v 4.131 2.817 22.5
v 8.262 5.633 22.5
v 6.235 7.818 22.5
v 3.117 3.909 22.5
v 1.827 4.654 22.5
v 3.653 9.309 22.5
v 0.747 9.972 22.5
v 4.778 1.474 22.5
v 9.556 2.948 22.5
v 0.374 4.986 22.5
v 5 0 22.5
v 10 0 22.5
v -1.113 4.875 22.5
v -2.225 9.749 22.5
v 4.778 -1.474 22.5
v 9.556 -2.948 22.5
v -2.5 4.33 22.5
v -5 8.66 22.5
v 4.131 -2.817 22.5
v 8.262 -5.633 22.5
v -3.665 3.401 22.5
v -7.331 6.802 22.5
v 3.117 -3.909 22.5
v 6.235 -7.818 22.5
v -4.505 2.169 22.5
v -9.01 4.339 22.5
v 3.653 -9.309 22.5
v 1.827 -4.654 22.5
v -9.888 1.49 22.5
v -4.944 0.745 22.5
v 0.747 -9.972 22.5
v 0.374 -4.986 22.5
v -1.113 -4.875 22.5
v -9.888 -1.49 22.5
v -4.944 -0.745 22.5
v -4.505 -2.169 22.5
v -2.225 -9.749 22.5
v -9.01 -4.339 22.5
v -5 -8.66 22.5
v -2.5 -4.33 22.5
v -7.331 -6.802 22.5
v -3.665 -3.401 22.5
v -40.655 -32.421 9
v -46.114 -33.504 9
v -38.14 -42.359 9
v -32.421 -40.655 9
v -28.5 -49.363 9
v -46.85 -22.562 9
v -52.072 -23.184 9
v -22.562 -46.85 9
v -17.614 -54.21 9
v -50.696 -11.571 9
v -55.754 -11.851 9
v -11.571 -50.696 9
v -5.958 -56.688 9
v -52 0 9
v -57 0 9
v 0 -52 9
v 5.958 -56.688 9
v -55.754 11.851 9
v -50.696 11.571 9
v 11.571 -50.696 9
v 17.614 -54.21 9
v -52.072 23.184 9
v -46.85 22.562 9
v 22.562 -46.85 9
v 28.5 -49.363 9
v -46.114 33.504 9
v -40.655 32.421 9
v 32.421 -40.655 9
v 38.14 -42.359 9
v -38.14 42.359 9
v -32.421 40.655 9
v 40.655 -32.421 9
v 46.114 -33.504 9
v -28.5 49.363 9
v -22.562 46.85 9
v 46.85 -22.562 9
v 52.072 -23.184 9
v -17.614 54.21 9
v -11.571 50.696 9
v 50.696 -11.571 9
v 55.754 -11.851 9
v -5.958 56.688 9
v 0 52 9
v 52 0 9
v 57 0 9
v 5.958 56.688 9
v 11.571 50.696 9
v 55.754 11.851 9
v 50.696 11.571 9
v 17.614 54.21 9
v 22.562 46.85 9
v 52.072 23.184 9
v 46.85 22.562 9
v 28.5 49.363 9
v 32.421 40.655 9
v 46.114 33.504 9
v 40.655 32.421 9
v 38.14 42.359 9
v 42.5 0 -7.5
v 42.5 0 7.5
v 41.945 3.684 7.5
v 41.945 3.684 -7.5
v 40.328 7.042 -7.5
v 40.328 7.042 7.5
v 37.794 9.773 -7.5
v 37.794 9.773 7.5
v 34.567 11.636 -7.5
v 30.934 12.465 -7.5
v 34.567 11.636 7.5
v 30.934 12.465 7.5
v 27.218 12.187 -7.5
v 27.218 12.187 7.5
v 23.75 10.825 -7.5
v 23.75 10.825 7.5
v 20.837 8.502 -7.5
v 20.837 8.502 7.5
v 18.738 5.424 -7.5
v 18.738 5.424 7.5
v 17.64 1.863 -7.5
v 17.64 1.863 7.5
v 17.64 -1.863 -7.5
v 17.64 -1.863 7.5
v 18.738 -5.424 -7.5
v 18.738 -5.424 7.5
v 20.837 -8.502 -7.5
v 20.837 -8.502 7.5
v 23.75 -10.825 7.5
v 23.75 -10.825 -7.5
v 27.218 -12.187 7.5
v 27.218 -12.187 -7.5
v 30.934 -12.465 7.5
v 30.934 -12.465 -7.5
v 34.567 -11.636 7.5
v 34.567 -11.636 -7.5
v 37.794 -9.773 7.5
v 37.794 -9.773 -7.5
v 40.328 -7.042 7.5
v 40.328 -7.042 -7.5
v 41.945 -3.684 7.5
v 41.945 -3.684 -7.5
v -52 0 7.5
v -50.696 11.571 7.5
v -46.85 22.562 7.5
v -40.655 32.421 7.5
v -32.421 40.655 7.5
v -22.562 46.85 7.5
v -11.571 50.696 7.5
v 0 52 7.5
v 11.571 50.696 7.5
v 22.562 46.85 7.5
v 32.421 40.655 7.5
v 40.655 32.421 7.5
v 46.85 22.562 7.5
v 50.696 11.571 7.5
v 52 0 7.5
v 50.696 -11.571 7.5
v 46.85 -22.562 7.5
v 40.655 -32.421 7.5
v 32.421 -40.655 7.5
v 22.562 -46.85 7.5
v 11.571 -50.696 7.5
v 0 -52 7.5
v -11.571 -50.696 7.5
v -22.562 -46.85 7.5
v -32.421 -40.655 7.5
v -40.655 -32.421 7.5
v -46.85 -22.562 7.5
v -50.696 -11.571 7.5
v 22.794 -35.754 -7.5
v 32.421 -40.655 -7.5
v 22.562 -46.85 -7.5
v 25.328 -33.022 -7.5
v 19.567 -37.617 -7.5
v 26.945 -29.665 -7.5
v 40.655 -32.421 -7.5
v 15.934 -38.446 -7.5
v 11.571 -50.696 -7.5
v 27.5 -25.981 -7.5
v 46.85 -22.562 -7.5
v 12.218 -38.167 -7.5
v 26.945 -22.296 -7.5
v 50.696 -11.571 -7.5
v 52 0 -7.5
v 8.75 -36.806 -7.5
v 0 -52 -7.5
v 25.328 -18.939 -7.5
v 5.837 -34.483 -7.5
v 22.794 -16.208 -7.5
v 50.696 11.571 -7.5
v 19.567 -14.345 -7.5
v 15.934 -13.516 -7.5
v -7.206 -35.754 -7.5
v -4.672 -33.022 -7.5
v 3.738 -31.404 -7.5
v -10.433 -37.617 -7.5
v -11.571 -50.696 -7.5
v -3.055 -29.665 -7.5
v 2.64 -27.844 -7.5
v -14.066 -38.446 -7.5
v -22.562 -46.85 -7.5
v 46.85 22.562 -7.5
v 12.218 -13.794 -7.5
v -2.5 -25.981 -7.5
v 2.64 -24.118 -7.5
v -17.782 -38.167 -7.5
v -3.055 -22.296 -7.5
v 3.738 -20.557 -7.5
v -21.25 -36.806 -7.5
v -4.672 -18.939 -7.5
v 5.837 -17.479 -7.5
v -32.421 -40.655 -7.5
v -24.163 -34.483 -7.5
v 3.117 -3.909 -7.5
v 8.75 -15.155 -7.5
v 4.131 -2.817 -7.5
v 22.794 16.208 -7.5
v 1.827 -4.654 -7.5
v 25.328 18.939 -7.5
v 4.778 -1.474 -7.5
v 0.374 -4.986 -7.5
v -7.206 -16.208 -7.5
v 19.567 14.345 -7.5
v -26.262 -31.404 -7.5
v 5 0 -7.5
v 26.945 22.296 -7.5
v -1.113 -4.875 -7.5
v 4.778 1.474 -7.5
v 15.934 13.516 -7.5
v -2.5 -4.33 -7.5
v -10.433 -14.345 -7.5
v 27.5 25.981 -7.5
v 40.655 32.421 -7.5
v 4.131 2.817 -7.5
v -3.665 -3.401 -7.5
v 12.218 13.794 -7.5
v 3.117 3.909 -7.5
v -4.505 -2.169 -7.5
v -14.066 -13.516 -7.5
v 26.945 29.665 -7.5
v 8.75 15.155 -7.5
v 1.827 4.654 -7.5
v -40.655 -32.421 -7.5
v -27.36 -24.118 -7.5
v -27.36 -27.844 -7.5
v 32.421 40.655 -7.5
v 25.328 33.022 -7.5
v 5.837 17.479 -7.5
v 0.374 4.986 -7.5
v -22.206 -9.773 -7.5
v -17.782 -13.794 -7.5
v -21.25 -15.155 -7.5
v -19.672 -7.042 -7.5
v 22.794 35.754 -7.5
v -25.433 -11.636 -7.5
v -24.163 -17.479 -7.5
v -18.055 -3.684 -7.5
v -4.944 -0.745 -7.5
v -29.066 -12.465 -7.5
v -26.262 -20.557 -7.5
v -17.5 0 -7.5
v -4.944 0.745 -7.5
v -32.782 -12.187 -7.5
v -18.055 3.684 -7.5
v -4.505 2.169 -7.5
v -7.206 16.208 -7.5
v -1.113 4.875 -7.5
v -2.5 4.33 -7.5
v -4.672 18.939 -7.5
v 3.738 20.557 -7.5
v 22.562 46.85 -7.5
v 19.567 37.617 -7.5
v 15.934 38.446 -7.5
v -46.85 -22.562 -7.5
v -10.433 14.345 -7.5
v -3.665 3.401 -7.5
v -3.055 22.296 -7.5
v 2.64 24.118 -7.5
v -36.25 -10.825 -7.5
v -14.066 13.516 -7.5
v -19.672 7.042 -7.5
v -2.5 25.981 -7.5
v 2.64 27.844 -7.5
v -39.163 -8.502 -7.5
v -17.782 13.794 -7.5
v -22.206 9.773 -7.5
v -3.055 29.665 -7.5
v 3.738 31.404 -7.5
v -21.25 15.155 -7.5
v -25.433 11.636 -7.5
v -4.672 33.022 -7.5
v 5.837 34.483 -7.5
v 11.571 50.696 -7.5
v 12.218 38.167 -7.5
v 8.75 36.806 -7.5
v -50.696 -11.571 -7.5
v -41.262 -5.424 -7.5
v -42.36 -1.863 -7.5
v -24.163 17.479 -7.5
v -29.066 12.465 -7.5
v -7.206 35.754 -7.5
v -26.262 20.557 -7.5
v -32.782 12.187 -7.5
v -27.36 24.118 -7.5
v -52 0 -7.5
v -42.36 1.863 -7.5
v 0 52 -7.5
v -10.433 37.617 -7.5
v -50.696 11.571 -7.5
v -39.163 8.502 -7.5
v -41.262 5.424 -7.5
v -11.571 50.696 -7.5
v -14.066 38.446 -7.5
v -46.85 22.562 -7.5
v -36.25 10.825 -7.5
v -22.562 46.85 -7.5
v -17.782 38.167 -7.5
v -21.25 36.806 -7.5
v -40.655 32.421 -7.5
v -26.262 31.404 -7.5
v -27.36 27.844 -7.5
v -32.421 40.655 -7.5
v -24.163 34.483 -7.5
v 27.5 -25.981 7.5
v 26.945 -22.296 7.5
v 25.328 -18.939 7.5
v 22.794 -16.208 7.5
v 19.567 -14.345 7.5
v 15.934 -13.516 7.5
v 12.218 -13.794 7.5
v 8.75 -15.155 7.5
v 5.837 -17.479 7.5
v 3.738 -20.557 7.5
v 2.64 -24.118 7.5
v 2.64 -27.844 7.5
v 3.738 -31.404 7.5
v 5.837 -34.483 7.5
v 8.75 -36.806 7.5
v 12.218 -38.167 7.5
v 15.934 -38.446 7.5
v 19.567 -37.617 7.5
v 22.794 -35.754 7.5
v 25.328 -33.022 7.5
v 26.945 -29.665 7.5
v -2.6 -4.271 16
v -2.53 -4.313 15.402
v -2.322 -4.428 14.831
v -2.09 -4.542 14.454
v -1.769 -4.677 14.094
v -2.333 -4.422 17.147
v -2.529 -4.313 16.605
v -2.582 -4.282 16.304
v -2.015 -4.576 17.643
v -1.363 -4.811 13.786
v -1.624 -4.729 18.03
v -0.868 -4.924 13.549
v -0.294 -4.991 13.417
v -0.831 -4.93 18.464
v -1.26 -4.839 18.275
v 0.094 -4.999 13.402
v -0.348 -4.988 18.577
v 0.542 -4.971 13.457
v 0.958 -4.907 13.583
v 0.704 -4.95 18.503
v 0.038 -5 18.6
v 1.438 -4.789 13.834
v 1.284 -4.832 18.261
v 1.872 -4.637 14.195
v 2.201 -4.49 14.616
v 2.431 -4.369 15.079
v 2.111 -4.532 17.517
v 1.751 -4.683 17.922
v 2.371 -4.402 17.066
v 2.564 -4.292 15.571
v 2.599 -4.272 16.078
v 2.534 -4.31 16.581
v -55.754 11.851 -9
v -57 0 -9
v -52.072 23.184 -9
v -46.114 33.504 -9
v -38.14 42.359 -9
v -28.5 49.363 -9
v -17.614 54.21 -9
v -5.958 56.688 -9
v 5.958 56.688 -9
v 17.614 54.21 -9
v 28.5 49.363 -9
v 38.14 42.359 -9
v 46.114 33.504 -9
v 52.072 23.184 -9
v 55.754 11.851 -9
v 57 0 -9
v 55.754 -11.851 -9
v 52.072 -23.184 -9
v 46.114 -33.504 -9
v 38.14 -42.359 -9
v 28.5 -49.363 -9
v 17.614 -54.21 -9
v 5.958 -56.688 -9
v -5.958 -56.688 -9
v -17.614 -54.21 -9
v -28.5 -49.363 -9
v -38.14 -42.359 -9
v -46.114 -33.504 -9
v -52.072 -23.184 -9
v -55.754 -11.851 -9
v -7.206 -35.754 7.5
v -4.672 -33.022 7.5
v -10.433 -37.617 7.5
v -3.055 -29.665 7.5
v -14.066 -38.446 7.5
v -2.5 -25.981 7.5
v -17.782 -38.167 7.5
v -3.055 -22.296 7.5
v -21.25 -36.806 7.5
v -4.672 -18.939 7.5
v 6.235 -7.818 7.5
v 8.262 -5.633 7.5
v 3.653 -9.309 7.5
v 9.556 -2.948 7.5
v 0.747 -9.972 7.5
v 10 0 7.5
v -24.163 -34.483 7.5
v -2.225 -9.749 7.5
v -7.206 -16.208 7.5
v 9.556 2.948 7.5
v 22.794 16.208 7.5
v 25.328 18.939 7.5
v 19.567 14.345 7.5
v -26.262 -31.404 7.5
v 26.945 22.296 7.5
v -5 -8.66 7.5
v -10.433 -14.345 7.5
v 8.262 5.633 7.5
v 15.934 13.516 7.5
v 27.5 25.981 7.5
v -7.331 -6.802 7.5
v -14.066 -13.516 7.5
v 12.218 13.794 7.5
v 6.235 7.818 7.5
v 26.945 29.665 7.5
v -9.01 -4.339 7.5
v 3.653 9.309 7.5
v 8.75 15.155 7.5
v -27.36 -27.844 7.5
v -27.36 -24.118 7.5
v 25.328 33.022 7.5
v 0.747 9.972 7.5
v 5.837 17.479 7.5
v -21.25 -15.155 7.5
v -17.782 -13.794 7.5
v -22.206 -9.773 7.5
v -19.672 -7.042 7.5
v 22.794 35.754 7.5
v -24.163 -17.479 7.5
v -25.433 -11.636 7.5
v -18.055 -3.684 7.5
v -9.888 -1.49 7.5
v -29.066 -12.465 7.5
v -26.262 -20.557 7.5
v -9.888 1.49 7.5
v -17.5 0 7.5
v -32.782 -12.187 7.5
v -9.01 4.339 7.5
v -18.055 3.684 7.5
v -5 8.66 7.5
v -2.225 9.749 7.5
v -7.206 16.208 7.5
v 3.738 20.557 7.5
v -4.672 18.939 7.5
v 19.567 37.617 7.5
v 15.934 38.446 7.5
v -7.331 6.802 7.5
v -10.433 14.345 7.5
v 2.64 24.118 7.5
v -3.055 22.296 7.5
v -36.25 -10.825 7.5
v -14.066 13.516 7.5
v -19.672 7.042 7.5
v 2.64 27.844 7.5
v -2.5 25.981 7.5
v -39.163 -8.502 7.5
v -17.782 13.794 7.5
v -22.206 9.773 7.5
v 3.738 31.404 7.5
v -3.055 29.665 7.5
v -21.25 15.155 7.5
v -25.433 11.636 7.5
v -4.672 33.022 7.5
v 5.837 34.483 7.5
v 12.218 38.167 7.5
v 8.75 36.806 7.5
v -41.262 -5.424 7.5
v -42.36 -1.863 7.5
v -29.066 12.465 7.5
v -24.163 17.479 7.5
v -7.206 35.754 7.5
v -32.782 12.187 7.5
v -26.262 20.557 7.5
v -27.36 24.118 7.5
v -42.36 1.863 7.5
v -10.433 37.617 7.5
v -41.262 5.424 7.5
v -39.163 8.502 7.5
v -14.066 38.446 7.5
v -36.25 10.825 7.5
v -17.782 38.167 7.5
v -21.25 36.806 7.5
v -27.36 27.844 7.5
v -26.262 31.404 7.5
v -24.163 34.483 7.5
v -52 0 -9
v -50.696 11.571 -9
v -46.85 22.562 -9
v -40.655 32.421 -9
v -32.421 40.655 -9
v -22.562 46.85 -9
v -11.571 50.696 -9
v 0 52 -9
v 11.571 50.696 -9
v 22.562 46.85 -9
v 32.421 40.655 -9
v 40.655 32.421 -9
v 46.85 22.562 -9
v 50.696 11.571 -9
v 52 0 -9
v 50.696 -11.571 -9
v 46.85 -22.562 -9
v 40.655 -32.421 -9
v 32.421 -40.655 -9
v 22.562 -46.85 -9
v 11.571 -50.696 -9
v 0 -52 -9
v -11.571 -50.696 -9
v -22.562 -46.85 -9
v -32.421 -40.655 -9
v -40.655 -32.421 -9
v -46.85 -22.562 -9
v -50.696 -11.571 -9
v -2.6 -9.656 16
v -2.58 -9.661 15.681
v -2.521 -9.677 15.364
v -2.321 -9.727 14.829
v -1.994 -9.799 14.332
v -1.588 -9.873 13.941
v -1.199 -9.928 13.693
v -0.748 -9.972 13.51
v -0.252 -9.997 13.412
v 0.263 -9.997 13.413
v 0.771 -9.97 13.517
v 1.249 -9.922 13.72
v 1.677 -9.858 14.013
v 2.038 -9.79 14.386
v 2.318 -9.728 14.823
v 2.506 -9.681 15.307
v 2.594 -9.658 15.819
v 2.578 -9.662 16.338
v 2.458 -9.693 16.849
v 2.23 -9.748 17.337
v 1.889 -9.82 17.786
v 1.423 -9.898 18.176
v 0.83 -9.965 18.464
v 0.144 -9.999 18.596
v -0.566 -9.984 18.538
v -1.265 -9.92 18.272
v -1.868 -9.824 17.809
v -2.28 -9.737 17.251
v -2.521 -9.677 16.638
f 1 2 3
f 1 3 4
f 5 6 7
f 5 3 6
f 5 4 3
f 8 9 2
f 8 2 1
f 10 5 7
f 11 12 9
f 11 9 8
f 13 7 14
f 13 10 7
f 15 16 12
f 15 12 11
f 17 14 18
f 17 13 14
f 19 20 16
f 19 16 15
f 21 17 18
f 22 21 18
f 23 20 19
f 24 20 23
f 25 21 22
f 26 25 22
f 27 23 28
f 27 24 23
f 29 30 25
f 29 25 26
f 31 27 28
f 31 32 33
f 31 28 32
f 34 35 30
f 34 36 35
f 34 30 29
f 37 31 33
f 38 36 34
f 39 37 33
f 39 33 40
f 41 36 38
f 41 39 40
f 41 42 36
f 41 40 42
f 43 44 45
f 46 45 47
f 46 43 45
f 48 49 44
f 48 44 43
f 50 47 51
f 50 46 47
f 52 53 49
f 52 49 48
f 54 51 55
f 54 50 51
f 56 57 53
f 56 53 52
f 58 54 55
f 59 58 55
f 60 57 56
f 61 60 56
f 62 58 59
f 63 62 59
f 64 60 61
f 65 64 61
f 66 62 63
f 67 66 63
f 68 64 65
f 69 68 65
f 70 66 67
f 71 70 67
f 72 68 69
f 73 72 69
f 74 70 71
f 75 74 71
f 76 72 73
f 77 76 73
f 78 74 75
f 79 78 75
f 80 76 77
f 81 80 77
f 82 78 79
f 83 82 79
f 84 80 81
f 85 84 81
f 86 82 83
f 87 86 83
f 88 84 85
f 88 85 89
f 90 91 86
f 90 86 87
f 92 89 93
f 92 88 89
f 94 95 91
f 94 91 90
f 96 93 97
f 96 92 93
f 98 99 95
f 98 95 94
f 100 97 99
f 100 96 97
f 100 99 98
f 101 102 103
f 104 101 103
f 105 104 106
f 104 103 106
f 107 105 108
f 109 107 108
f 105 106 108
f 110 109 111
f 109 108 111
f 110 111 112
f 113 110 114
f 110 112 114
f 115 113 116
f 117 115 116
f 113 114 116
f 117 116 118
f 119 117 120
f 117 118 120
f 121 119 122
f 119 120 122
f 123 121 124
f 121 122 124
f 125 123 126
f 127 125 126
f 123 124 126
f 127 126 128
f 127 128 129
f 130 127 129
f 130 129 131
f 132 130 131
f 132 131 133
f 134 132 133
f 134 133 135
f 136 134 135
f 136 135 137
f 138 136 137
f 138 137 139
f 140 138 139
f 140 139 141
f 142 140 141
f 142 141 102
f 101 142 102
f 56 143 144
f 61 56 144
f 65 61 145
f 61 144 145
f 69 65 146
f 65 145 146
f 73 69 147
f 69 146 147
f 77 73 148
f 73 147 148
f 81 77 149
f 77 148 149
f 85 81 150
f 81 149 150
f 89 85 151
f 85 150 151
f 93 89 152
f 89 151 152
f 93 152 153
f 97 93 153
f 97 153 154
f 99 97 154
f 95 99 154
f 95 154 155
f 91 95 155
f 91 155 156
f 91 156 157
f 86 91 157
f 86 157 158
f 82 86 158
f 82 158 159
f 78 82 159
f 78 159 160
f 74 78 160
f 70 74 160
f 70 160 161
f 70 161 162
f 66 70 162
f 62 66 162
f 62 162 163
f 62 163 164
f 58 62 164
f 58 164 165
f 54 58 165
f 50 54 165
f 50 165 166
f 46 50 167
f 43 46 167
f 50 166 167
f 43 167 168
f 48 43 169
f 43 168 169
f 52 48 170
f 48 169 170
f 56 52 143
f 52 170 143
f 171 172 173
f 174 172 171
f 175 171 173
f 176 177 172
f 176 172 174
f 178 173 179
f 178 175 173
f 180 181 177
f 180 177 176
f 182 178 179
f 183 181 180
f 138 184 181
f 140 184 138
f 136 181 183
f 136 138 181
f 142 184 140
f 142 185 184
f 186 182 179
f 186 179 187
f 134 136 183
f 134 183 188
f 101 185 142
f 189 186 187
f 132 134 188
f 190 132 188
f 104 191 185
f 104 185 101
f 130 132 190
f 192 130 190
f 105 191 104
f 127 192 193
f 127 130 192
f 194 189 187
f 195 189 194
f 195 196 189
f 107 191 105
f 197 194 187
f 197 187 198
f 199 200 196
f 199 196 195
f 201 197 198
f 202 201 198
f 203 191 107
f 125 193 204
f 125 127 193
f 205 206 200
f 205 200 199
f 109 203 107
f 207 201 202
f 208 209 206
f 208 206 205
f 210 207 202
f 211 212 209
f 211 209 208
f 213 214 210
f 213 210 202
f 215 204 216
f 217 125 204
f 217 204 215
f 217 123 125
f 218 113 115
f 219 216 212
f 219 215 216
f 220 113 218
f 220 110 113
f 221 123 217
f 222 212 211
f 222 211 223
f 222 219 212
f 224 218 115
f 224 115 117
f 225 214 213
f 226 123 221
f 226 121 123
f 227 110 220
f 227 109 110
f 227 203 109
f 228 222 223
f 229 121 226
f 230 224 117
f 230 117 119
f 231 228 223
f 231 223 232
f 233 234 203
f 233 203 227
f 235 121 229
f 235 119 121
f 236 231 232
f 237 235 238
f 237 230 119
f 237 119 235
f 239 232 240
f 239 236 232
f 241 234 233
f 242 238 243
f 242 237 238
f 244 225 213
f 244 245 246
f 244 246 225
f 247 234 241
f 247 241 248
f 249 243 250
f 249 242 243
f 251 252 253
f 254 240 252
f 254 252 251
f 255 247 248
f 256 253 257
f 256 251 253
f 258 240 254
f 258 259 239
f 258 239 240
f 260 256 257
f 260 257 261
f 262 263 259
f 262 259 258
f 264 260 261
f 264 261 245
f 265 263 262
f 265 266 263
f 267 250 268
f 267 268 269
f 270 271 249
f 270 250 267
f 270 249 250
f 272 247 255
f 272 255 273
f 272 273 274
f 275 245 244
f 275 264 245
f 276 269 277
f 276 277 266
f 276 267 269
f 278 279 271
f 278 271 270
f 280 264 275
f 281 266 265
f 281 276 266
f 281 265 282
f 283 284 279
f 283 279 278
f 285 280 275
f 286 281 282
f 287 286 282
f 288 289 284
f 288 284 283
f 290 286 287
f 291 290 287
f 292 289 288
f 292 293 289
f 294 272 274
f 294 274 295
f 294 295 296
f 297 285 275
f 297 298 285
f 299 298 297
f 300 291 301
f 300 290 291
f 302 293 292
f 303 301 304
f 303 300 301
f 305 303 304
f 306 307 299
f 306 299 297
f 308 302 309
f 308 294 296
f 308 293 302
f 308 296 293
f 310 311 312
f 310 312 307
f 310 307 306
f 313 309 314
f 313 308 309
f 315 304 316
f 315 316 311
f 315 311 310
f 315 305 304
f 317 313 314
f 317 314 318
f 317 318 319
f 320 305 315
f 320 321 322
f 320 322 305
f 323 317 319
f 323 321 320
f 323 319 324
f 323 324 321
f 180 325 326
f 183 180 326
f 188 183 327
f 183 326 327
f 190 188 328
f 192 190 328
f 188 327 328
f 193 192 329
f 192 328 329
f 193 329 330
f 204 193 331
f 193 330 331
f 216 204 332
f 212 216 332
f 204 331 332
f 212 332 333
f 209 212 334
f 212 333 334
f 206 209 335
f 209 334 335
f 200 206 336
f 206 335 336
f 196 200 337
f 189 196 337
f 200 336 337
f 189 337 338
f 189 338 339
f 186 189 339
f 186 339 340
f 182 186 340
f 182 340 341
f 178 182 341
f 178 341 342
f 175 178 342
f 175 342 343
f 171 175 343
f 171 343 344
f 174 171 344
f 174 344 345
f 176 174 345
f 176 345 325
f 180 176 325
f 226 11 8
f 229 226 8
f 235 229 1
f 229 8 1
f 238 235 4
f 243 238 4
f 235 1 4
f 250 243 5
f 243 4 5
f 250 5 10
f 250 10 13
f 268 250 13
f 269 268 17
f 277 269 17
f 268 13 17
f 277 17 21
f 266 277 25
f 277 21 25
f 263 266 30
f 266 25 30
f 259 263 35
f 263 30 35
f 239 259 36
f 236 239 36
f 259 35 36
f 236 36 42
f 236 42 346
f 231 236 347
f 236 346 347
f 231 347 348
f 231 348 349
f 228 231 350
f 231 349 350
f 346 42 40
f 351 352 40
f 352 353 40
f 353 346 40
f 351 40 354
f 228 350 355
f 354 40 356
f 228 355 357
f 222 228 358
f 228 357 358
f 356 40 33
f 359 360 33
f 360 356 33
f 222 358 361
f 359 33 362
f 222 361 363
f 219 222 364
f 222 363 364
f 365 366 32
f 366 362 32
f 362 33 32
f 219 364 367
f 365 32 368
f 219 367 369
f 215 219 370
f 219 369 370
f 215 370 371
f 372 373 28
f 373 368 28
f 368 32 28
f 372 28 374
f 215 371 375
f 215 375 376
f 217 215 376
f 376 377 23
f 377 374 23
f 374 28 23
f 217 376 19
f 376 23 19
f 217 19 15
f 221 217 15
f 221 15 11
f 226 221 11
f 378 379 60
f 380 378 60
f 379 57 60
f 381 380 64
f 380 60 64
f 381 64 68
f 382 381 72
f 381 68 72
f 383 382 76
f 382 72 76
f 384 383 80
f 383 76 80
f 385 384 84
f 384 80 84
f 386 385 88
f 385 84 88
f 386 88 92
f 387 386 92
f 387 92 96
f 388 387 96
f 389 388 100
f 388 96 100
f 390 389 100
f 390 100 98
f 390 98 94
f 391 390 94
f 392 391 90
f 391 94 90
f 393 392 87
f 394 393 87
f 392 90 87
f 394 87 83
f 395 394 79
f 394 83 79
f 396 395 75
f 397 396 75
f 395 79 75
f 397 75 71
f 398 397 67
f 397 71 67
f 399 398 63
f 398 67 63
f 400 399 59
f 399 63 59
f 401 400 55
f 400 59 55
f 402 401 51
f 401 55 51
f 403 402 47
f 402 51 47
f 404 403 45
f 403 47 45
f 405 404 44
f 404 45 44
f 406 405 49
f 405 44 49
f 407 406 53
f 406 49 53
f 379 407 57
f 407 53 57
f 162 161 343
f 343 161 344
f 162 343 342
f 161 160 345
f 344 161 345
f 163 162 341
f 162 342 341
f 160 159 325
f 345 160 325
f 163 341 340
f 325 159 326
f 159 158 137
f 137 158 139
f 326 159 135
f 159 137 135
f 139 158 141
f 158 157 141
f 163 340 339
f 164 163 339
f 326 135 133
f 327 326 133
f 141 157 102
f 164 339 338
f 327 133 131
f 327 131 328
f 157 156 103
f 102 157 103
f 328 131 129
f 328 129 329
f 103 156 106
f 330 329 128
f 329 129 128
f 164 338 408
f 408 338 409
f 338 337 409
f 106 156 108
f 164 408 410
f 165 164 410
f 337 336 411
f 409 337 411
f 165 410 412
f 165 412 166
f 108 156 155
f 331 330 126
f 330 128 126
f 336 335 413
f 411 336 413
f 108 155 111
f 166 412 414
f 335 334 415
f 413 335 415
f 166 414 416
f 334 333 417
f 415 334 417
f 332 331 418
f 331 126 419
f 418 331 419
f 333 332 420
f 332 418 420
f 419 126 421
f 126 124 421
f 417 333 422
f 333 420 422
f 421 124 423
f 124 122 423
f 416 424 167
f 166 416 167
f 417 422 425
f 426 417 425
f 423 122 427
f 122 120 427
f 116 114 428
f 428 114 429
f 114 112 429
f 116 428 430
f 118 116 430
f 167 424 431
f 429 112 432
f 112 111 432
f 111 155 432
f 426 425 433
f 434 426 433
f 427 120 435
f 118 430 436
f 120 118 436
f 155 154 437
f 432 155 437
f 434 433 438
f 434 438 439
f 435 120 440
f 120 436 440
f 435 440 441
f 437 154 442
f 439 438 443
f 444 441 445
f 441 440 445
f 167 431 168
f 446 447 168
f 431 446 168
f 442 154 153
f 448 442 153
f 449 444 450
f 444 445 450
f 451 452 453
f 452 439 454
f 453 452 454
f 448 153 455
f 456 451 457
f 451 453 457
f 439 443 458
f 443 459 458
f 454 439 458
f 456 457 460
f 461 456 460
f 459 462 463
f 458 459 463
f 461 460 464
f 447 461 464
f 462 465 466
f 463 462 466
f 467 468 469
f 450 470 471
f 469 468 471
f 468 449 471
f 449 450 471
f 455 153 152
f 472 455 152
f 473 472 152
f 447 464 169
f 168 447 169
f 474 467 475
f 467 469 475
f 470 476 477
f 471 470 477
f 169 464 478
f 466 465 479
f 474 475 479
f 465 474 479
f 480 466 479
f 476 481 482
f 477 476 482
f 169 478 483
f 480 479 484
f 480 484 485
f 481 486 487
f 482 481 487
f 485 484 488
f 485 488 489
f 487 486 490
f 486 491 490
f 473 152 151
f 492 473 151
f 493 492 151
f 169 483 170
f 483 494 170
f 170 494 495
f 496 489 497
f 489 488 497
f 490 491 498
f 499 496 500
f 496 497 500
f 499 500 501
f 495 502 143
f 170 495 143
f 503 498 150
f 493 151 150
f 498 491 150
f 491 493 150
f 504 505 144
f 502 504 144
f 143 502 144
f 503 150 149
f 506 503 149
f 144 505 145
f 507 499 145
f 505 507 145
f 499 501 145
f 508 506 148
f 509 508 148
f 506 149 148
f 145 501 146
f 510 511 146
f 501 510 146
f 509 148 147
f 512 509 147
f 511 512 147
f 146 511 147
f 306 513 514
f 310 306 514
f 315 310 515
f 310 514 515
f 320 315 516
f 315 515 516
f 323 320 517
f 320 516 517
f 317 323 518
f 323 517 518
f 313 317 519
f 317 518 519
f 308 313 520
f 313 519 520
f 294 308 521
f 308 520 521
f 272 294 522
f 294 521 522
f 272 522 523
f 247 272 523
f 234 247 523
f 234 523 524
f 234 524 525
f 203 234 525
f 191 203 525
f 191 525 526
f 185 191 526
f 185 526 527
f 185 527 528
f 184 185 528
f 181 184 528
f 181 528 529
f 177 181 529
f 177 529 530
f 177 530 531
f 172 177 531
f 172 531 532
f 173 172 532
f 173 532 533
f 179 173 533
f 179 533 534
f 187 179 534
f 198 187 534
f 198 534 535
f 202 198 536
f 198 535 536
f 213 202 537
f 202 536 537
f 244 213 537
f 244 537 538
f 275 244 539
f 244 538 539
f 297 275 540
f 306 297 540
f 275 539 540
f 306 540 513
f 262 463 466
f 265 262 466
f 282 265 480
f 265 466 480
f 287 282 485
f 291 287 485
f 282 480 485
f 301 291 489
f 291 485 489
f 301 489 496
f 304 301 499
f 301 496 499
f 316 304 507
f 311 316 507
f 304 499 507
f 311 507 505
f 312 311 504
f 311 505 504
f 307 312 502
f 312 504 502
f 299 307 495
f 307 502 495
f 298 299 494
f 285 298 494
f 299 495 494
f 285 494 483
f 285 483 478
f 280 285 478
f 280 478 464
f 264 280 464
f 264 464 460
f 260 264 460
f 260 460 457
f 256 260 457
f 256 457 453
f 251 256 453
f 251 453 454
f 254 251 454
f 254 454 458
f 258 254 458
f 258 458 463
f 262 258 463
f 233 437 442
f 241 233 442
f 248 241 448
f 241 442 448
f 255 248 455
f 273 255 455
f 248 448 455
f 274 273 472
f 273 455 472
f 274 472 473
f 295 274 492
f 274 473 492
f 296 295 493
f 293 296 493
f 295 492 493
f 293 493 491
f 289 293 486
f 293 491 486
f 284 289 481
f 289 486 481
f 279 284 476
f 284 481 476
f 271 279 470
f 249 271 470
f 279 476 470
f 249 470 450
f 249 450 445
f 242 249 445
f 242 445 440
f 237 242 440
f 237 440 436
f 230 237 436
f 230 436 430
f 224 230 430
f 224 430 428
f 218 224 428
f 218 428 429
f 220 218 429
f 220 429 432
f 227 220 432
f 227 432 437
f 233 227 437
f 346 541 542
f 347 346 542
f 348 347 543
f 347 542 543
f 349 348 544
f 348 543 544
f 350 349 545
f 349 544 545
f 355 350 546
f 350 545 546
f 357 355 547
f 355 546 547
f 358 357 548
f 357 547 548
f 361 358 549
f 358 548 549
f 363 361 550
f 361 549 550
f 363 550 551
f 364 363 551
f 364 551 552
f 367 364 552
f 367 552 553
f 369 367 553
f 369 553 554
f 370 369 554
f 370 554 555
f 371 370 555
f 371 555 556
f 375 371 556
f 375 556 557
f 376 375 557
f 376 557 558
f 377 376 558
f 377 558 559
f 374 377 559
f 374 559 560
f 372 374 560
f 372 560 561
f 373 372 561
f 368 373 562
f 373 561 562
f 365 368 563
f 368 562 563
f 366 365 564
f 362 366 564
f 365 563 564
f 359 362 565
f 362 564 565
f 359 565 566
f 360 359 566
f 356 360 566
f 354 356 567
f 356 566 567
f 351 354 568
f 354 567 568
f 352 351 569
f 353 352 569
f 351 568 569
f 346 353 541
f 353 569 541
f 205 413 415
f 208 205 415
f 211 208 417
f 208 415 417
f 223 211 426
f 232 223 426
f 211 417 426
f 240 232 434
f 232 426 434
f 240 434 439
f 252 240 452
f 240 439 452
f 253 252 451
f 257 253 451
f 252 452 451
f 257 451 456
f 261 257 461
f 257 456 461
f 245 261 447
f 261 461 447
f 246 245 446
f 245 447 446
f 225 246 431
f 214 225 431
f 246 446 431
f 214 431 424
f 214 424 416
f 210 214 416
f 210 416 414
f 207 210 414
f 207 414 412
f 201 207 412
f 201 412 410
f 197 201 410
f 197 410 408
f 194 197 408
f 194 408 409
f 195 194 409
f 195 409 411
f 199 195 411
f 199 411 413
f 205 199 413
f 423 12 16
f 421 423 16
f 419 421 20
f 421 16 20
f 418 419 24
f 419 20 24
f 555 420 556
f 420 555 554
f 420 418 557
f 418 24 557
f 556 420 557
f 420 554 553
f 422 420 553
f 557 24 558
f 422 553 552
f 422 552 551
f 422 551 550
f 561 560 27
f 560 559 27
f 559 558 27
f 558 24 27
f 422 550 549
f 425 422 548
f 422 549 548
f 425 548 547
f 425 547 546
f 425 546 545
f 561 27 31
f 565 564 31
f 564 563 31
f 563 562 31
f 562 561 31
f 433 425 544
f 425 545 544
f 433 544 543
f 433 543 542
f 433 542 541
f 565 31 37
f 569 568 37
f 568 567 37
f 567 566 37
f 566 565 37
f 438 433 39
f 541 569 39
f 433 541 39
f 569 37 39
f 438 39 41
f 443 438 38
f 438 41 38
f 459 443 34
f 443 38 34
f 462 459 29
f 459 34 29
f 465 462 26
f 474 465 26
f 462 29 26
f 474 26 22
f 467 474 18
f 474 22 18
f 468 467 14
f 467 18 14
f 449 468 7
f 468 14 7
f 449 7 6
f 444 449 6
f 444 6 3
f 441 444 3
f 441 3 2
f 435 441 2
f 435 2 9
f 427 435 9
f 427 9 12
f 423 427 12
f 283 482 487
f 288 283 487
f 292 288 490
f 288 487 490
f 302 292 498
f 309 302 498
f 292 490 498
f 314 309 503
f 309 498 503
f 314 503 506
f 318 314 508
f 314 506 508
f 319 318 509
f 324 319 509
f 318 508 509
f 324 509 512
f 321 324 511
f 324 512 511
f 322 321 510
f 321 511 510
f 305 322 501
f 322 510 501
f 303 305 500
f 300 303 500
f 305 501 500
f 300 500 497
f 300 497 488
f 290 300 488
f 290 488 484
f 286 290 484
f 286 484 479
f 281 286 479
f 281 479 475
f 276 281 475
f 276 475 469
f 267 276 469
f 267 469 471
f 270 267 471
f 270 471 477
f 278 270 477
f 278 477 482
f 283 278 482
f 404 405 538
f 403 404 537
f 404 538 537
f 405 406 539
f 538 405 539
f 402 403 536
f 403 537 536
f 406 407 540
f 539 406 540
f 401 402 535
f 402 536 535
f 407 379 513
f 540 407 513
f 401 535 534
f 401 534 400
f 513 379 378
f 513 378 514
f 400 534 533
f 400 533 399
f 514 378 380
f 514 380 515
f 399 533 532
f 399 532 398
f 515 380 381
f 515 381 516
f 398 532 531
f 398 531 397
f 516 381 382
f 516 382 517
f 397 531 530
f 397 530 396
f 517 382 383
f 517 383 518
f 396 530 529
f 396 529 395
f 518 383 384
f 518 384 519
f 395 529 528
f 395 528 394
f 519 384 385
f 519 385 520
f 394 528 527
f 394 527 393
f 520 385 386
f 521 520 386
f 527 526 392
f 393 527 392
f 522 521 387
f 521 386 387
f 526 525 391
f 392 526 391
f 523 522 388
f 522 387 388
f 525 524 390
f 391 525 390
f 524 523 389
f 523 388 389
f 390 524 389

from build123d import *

# Parameters (mm, degrees)
SKETCH_1_W                   = 57
SKETCH_1_H                   = 18
HOLE_WIZARD_M100_1_D         = 104
HOLE_WIZARD_M100_1_DEPTH     = 1.5
SKETCH_4_W                   = 10
SKETCH_4_H                   = 15
HOLE_WIZARD_M8_1_D           = 10
HOLE_WIZARD_M8_1_CBORE_D     = 104
HOLE_WIZARD_M8_1_CBORE_DEPTH = 1.5
HOLE_WIZARD_5_2_5_2_1_REACH  = 93.449
HOLE_WIZARD_5_2_5_2_1_BORE_R = 2.6
HOLE_WIZARD_25_0_25_1_D      = 25
HOLE_WIZARD_25_0_25_1_DEPTH  = 30


with BuildPart() as part:
    # 草图1 → 旋转1 (revolve)
    with BuildSketch(Plane.XZ, mode=Mode.PRIVATE) as revolve_1_sk:
        with Locations((28.5, 0)):
            Rectangle(SKETCH_1_W, SKETCH_1_H)
    revolve(revolve_1_sk.sketch.rotate(Axis((0, 0, 9), (0, 0, -1)), 180), axis=Axis((0, 0, 9), (0, 0, -1)))

    # M100 间隙孔1
    with Locations(Plane.XY.offset(9)):
        with Locations((0, 0)):
            Hole(HOLE_WIZARD_M100_1_D / 2, depth=HOLE_WIZARD_M100_1_DEPTH)

    # 草图4 → 旋转2 (revolve)
    with BuildSketch(Plane.XZ):
        with Locations((5, 15)):
            Rectangle(SKETCH_4_W, SKETCH_4_H)
    revolve(axis=Axis((0, 0, 22.5), (0, 0, -1)))

    # M8 六角头螺栓的柱形沉头孔1 (through all)
    with Locations(Plane(origin=(0, 0, -9), x_dir=(-1, 0, 0), z_dir=(0, 0, -1))):
        with Locations((0, 0)):
            CounterBoreHole(HOLE_WIZARD_M8_1_D / 2, HOLE_WIZARD_M8_1_CBORE_D / 2, HOLE_WIZARD_M8_1_CBORE_DEPTH)

    # Ø5.2 (5.2) 直径孔1 bore (on position points) → Ø5.2 (5.2) 直径孔1 (cut, up to next)
    with BuildSketch(Plane(origin=(0, -10, 16), x_dir=(-1, 0, 0), z_dir=(0, -1, 0)), mode=Mode.PRIVATE) as hole_wizard_5_2_5_2_1_sk1:
        Circle(HOLE_WIZARD_5_2_5_2_1_BORE_R)
    hole_wizard_5_2_5_2_1_tool1 = extrude(hole_wizard_5_2_5_2_1_sk1.sketch, amount=-HOLE_WIZARD_5_2_5_2_1_REACH, mode=Mode.PRIVATE) & part.part
    add(hole_wizard_5_2_5_2_1_tool1.solids().sort_by_distance((0, -10, 16))[0], mode=Mode.SUBTRACT)

    # Ø25.0 (25) 直径孔1
    with Locations(Plane(origin=(0, 0, -7.5), x_dir=(-1, 0, 0), z_dir=(0, 0, -1))):
        with Locations((-30, 0), (-15, 25.980762114), (15, 25.980762114), (30, 0), (15, -25.980762114), (-15, -25.980762114)):
            Hole(HOLE_WIZARD_25_0_25_1_D / 2, depth=HOLE_WIZARD_25_0_25_1_DEPTH)


solid = part.part
